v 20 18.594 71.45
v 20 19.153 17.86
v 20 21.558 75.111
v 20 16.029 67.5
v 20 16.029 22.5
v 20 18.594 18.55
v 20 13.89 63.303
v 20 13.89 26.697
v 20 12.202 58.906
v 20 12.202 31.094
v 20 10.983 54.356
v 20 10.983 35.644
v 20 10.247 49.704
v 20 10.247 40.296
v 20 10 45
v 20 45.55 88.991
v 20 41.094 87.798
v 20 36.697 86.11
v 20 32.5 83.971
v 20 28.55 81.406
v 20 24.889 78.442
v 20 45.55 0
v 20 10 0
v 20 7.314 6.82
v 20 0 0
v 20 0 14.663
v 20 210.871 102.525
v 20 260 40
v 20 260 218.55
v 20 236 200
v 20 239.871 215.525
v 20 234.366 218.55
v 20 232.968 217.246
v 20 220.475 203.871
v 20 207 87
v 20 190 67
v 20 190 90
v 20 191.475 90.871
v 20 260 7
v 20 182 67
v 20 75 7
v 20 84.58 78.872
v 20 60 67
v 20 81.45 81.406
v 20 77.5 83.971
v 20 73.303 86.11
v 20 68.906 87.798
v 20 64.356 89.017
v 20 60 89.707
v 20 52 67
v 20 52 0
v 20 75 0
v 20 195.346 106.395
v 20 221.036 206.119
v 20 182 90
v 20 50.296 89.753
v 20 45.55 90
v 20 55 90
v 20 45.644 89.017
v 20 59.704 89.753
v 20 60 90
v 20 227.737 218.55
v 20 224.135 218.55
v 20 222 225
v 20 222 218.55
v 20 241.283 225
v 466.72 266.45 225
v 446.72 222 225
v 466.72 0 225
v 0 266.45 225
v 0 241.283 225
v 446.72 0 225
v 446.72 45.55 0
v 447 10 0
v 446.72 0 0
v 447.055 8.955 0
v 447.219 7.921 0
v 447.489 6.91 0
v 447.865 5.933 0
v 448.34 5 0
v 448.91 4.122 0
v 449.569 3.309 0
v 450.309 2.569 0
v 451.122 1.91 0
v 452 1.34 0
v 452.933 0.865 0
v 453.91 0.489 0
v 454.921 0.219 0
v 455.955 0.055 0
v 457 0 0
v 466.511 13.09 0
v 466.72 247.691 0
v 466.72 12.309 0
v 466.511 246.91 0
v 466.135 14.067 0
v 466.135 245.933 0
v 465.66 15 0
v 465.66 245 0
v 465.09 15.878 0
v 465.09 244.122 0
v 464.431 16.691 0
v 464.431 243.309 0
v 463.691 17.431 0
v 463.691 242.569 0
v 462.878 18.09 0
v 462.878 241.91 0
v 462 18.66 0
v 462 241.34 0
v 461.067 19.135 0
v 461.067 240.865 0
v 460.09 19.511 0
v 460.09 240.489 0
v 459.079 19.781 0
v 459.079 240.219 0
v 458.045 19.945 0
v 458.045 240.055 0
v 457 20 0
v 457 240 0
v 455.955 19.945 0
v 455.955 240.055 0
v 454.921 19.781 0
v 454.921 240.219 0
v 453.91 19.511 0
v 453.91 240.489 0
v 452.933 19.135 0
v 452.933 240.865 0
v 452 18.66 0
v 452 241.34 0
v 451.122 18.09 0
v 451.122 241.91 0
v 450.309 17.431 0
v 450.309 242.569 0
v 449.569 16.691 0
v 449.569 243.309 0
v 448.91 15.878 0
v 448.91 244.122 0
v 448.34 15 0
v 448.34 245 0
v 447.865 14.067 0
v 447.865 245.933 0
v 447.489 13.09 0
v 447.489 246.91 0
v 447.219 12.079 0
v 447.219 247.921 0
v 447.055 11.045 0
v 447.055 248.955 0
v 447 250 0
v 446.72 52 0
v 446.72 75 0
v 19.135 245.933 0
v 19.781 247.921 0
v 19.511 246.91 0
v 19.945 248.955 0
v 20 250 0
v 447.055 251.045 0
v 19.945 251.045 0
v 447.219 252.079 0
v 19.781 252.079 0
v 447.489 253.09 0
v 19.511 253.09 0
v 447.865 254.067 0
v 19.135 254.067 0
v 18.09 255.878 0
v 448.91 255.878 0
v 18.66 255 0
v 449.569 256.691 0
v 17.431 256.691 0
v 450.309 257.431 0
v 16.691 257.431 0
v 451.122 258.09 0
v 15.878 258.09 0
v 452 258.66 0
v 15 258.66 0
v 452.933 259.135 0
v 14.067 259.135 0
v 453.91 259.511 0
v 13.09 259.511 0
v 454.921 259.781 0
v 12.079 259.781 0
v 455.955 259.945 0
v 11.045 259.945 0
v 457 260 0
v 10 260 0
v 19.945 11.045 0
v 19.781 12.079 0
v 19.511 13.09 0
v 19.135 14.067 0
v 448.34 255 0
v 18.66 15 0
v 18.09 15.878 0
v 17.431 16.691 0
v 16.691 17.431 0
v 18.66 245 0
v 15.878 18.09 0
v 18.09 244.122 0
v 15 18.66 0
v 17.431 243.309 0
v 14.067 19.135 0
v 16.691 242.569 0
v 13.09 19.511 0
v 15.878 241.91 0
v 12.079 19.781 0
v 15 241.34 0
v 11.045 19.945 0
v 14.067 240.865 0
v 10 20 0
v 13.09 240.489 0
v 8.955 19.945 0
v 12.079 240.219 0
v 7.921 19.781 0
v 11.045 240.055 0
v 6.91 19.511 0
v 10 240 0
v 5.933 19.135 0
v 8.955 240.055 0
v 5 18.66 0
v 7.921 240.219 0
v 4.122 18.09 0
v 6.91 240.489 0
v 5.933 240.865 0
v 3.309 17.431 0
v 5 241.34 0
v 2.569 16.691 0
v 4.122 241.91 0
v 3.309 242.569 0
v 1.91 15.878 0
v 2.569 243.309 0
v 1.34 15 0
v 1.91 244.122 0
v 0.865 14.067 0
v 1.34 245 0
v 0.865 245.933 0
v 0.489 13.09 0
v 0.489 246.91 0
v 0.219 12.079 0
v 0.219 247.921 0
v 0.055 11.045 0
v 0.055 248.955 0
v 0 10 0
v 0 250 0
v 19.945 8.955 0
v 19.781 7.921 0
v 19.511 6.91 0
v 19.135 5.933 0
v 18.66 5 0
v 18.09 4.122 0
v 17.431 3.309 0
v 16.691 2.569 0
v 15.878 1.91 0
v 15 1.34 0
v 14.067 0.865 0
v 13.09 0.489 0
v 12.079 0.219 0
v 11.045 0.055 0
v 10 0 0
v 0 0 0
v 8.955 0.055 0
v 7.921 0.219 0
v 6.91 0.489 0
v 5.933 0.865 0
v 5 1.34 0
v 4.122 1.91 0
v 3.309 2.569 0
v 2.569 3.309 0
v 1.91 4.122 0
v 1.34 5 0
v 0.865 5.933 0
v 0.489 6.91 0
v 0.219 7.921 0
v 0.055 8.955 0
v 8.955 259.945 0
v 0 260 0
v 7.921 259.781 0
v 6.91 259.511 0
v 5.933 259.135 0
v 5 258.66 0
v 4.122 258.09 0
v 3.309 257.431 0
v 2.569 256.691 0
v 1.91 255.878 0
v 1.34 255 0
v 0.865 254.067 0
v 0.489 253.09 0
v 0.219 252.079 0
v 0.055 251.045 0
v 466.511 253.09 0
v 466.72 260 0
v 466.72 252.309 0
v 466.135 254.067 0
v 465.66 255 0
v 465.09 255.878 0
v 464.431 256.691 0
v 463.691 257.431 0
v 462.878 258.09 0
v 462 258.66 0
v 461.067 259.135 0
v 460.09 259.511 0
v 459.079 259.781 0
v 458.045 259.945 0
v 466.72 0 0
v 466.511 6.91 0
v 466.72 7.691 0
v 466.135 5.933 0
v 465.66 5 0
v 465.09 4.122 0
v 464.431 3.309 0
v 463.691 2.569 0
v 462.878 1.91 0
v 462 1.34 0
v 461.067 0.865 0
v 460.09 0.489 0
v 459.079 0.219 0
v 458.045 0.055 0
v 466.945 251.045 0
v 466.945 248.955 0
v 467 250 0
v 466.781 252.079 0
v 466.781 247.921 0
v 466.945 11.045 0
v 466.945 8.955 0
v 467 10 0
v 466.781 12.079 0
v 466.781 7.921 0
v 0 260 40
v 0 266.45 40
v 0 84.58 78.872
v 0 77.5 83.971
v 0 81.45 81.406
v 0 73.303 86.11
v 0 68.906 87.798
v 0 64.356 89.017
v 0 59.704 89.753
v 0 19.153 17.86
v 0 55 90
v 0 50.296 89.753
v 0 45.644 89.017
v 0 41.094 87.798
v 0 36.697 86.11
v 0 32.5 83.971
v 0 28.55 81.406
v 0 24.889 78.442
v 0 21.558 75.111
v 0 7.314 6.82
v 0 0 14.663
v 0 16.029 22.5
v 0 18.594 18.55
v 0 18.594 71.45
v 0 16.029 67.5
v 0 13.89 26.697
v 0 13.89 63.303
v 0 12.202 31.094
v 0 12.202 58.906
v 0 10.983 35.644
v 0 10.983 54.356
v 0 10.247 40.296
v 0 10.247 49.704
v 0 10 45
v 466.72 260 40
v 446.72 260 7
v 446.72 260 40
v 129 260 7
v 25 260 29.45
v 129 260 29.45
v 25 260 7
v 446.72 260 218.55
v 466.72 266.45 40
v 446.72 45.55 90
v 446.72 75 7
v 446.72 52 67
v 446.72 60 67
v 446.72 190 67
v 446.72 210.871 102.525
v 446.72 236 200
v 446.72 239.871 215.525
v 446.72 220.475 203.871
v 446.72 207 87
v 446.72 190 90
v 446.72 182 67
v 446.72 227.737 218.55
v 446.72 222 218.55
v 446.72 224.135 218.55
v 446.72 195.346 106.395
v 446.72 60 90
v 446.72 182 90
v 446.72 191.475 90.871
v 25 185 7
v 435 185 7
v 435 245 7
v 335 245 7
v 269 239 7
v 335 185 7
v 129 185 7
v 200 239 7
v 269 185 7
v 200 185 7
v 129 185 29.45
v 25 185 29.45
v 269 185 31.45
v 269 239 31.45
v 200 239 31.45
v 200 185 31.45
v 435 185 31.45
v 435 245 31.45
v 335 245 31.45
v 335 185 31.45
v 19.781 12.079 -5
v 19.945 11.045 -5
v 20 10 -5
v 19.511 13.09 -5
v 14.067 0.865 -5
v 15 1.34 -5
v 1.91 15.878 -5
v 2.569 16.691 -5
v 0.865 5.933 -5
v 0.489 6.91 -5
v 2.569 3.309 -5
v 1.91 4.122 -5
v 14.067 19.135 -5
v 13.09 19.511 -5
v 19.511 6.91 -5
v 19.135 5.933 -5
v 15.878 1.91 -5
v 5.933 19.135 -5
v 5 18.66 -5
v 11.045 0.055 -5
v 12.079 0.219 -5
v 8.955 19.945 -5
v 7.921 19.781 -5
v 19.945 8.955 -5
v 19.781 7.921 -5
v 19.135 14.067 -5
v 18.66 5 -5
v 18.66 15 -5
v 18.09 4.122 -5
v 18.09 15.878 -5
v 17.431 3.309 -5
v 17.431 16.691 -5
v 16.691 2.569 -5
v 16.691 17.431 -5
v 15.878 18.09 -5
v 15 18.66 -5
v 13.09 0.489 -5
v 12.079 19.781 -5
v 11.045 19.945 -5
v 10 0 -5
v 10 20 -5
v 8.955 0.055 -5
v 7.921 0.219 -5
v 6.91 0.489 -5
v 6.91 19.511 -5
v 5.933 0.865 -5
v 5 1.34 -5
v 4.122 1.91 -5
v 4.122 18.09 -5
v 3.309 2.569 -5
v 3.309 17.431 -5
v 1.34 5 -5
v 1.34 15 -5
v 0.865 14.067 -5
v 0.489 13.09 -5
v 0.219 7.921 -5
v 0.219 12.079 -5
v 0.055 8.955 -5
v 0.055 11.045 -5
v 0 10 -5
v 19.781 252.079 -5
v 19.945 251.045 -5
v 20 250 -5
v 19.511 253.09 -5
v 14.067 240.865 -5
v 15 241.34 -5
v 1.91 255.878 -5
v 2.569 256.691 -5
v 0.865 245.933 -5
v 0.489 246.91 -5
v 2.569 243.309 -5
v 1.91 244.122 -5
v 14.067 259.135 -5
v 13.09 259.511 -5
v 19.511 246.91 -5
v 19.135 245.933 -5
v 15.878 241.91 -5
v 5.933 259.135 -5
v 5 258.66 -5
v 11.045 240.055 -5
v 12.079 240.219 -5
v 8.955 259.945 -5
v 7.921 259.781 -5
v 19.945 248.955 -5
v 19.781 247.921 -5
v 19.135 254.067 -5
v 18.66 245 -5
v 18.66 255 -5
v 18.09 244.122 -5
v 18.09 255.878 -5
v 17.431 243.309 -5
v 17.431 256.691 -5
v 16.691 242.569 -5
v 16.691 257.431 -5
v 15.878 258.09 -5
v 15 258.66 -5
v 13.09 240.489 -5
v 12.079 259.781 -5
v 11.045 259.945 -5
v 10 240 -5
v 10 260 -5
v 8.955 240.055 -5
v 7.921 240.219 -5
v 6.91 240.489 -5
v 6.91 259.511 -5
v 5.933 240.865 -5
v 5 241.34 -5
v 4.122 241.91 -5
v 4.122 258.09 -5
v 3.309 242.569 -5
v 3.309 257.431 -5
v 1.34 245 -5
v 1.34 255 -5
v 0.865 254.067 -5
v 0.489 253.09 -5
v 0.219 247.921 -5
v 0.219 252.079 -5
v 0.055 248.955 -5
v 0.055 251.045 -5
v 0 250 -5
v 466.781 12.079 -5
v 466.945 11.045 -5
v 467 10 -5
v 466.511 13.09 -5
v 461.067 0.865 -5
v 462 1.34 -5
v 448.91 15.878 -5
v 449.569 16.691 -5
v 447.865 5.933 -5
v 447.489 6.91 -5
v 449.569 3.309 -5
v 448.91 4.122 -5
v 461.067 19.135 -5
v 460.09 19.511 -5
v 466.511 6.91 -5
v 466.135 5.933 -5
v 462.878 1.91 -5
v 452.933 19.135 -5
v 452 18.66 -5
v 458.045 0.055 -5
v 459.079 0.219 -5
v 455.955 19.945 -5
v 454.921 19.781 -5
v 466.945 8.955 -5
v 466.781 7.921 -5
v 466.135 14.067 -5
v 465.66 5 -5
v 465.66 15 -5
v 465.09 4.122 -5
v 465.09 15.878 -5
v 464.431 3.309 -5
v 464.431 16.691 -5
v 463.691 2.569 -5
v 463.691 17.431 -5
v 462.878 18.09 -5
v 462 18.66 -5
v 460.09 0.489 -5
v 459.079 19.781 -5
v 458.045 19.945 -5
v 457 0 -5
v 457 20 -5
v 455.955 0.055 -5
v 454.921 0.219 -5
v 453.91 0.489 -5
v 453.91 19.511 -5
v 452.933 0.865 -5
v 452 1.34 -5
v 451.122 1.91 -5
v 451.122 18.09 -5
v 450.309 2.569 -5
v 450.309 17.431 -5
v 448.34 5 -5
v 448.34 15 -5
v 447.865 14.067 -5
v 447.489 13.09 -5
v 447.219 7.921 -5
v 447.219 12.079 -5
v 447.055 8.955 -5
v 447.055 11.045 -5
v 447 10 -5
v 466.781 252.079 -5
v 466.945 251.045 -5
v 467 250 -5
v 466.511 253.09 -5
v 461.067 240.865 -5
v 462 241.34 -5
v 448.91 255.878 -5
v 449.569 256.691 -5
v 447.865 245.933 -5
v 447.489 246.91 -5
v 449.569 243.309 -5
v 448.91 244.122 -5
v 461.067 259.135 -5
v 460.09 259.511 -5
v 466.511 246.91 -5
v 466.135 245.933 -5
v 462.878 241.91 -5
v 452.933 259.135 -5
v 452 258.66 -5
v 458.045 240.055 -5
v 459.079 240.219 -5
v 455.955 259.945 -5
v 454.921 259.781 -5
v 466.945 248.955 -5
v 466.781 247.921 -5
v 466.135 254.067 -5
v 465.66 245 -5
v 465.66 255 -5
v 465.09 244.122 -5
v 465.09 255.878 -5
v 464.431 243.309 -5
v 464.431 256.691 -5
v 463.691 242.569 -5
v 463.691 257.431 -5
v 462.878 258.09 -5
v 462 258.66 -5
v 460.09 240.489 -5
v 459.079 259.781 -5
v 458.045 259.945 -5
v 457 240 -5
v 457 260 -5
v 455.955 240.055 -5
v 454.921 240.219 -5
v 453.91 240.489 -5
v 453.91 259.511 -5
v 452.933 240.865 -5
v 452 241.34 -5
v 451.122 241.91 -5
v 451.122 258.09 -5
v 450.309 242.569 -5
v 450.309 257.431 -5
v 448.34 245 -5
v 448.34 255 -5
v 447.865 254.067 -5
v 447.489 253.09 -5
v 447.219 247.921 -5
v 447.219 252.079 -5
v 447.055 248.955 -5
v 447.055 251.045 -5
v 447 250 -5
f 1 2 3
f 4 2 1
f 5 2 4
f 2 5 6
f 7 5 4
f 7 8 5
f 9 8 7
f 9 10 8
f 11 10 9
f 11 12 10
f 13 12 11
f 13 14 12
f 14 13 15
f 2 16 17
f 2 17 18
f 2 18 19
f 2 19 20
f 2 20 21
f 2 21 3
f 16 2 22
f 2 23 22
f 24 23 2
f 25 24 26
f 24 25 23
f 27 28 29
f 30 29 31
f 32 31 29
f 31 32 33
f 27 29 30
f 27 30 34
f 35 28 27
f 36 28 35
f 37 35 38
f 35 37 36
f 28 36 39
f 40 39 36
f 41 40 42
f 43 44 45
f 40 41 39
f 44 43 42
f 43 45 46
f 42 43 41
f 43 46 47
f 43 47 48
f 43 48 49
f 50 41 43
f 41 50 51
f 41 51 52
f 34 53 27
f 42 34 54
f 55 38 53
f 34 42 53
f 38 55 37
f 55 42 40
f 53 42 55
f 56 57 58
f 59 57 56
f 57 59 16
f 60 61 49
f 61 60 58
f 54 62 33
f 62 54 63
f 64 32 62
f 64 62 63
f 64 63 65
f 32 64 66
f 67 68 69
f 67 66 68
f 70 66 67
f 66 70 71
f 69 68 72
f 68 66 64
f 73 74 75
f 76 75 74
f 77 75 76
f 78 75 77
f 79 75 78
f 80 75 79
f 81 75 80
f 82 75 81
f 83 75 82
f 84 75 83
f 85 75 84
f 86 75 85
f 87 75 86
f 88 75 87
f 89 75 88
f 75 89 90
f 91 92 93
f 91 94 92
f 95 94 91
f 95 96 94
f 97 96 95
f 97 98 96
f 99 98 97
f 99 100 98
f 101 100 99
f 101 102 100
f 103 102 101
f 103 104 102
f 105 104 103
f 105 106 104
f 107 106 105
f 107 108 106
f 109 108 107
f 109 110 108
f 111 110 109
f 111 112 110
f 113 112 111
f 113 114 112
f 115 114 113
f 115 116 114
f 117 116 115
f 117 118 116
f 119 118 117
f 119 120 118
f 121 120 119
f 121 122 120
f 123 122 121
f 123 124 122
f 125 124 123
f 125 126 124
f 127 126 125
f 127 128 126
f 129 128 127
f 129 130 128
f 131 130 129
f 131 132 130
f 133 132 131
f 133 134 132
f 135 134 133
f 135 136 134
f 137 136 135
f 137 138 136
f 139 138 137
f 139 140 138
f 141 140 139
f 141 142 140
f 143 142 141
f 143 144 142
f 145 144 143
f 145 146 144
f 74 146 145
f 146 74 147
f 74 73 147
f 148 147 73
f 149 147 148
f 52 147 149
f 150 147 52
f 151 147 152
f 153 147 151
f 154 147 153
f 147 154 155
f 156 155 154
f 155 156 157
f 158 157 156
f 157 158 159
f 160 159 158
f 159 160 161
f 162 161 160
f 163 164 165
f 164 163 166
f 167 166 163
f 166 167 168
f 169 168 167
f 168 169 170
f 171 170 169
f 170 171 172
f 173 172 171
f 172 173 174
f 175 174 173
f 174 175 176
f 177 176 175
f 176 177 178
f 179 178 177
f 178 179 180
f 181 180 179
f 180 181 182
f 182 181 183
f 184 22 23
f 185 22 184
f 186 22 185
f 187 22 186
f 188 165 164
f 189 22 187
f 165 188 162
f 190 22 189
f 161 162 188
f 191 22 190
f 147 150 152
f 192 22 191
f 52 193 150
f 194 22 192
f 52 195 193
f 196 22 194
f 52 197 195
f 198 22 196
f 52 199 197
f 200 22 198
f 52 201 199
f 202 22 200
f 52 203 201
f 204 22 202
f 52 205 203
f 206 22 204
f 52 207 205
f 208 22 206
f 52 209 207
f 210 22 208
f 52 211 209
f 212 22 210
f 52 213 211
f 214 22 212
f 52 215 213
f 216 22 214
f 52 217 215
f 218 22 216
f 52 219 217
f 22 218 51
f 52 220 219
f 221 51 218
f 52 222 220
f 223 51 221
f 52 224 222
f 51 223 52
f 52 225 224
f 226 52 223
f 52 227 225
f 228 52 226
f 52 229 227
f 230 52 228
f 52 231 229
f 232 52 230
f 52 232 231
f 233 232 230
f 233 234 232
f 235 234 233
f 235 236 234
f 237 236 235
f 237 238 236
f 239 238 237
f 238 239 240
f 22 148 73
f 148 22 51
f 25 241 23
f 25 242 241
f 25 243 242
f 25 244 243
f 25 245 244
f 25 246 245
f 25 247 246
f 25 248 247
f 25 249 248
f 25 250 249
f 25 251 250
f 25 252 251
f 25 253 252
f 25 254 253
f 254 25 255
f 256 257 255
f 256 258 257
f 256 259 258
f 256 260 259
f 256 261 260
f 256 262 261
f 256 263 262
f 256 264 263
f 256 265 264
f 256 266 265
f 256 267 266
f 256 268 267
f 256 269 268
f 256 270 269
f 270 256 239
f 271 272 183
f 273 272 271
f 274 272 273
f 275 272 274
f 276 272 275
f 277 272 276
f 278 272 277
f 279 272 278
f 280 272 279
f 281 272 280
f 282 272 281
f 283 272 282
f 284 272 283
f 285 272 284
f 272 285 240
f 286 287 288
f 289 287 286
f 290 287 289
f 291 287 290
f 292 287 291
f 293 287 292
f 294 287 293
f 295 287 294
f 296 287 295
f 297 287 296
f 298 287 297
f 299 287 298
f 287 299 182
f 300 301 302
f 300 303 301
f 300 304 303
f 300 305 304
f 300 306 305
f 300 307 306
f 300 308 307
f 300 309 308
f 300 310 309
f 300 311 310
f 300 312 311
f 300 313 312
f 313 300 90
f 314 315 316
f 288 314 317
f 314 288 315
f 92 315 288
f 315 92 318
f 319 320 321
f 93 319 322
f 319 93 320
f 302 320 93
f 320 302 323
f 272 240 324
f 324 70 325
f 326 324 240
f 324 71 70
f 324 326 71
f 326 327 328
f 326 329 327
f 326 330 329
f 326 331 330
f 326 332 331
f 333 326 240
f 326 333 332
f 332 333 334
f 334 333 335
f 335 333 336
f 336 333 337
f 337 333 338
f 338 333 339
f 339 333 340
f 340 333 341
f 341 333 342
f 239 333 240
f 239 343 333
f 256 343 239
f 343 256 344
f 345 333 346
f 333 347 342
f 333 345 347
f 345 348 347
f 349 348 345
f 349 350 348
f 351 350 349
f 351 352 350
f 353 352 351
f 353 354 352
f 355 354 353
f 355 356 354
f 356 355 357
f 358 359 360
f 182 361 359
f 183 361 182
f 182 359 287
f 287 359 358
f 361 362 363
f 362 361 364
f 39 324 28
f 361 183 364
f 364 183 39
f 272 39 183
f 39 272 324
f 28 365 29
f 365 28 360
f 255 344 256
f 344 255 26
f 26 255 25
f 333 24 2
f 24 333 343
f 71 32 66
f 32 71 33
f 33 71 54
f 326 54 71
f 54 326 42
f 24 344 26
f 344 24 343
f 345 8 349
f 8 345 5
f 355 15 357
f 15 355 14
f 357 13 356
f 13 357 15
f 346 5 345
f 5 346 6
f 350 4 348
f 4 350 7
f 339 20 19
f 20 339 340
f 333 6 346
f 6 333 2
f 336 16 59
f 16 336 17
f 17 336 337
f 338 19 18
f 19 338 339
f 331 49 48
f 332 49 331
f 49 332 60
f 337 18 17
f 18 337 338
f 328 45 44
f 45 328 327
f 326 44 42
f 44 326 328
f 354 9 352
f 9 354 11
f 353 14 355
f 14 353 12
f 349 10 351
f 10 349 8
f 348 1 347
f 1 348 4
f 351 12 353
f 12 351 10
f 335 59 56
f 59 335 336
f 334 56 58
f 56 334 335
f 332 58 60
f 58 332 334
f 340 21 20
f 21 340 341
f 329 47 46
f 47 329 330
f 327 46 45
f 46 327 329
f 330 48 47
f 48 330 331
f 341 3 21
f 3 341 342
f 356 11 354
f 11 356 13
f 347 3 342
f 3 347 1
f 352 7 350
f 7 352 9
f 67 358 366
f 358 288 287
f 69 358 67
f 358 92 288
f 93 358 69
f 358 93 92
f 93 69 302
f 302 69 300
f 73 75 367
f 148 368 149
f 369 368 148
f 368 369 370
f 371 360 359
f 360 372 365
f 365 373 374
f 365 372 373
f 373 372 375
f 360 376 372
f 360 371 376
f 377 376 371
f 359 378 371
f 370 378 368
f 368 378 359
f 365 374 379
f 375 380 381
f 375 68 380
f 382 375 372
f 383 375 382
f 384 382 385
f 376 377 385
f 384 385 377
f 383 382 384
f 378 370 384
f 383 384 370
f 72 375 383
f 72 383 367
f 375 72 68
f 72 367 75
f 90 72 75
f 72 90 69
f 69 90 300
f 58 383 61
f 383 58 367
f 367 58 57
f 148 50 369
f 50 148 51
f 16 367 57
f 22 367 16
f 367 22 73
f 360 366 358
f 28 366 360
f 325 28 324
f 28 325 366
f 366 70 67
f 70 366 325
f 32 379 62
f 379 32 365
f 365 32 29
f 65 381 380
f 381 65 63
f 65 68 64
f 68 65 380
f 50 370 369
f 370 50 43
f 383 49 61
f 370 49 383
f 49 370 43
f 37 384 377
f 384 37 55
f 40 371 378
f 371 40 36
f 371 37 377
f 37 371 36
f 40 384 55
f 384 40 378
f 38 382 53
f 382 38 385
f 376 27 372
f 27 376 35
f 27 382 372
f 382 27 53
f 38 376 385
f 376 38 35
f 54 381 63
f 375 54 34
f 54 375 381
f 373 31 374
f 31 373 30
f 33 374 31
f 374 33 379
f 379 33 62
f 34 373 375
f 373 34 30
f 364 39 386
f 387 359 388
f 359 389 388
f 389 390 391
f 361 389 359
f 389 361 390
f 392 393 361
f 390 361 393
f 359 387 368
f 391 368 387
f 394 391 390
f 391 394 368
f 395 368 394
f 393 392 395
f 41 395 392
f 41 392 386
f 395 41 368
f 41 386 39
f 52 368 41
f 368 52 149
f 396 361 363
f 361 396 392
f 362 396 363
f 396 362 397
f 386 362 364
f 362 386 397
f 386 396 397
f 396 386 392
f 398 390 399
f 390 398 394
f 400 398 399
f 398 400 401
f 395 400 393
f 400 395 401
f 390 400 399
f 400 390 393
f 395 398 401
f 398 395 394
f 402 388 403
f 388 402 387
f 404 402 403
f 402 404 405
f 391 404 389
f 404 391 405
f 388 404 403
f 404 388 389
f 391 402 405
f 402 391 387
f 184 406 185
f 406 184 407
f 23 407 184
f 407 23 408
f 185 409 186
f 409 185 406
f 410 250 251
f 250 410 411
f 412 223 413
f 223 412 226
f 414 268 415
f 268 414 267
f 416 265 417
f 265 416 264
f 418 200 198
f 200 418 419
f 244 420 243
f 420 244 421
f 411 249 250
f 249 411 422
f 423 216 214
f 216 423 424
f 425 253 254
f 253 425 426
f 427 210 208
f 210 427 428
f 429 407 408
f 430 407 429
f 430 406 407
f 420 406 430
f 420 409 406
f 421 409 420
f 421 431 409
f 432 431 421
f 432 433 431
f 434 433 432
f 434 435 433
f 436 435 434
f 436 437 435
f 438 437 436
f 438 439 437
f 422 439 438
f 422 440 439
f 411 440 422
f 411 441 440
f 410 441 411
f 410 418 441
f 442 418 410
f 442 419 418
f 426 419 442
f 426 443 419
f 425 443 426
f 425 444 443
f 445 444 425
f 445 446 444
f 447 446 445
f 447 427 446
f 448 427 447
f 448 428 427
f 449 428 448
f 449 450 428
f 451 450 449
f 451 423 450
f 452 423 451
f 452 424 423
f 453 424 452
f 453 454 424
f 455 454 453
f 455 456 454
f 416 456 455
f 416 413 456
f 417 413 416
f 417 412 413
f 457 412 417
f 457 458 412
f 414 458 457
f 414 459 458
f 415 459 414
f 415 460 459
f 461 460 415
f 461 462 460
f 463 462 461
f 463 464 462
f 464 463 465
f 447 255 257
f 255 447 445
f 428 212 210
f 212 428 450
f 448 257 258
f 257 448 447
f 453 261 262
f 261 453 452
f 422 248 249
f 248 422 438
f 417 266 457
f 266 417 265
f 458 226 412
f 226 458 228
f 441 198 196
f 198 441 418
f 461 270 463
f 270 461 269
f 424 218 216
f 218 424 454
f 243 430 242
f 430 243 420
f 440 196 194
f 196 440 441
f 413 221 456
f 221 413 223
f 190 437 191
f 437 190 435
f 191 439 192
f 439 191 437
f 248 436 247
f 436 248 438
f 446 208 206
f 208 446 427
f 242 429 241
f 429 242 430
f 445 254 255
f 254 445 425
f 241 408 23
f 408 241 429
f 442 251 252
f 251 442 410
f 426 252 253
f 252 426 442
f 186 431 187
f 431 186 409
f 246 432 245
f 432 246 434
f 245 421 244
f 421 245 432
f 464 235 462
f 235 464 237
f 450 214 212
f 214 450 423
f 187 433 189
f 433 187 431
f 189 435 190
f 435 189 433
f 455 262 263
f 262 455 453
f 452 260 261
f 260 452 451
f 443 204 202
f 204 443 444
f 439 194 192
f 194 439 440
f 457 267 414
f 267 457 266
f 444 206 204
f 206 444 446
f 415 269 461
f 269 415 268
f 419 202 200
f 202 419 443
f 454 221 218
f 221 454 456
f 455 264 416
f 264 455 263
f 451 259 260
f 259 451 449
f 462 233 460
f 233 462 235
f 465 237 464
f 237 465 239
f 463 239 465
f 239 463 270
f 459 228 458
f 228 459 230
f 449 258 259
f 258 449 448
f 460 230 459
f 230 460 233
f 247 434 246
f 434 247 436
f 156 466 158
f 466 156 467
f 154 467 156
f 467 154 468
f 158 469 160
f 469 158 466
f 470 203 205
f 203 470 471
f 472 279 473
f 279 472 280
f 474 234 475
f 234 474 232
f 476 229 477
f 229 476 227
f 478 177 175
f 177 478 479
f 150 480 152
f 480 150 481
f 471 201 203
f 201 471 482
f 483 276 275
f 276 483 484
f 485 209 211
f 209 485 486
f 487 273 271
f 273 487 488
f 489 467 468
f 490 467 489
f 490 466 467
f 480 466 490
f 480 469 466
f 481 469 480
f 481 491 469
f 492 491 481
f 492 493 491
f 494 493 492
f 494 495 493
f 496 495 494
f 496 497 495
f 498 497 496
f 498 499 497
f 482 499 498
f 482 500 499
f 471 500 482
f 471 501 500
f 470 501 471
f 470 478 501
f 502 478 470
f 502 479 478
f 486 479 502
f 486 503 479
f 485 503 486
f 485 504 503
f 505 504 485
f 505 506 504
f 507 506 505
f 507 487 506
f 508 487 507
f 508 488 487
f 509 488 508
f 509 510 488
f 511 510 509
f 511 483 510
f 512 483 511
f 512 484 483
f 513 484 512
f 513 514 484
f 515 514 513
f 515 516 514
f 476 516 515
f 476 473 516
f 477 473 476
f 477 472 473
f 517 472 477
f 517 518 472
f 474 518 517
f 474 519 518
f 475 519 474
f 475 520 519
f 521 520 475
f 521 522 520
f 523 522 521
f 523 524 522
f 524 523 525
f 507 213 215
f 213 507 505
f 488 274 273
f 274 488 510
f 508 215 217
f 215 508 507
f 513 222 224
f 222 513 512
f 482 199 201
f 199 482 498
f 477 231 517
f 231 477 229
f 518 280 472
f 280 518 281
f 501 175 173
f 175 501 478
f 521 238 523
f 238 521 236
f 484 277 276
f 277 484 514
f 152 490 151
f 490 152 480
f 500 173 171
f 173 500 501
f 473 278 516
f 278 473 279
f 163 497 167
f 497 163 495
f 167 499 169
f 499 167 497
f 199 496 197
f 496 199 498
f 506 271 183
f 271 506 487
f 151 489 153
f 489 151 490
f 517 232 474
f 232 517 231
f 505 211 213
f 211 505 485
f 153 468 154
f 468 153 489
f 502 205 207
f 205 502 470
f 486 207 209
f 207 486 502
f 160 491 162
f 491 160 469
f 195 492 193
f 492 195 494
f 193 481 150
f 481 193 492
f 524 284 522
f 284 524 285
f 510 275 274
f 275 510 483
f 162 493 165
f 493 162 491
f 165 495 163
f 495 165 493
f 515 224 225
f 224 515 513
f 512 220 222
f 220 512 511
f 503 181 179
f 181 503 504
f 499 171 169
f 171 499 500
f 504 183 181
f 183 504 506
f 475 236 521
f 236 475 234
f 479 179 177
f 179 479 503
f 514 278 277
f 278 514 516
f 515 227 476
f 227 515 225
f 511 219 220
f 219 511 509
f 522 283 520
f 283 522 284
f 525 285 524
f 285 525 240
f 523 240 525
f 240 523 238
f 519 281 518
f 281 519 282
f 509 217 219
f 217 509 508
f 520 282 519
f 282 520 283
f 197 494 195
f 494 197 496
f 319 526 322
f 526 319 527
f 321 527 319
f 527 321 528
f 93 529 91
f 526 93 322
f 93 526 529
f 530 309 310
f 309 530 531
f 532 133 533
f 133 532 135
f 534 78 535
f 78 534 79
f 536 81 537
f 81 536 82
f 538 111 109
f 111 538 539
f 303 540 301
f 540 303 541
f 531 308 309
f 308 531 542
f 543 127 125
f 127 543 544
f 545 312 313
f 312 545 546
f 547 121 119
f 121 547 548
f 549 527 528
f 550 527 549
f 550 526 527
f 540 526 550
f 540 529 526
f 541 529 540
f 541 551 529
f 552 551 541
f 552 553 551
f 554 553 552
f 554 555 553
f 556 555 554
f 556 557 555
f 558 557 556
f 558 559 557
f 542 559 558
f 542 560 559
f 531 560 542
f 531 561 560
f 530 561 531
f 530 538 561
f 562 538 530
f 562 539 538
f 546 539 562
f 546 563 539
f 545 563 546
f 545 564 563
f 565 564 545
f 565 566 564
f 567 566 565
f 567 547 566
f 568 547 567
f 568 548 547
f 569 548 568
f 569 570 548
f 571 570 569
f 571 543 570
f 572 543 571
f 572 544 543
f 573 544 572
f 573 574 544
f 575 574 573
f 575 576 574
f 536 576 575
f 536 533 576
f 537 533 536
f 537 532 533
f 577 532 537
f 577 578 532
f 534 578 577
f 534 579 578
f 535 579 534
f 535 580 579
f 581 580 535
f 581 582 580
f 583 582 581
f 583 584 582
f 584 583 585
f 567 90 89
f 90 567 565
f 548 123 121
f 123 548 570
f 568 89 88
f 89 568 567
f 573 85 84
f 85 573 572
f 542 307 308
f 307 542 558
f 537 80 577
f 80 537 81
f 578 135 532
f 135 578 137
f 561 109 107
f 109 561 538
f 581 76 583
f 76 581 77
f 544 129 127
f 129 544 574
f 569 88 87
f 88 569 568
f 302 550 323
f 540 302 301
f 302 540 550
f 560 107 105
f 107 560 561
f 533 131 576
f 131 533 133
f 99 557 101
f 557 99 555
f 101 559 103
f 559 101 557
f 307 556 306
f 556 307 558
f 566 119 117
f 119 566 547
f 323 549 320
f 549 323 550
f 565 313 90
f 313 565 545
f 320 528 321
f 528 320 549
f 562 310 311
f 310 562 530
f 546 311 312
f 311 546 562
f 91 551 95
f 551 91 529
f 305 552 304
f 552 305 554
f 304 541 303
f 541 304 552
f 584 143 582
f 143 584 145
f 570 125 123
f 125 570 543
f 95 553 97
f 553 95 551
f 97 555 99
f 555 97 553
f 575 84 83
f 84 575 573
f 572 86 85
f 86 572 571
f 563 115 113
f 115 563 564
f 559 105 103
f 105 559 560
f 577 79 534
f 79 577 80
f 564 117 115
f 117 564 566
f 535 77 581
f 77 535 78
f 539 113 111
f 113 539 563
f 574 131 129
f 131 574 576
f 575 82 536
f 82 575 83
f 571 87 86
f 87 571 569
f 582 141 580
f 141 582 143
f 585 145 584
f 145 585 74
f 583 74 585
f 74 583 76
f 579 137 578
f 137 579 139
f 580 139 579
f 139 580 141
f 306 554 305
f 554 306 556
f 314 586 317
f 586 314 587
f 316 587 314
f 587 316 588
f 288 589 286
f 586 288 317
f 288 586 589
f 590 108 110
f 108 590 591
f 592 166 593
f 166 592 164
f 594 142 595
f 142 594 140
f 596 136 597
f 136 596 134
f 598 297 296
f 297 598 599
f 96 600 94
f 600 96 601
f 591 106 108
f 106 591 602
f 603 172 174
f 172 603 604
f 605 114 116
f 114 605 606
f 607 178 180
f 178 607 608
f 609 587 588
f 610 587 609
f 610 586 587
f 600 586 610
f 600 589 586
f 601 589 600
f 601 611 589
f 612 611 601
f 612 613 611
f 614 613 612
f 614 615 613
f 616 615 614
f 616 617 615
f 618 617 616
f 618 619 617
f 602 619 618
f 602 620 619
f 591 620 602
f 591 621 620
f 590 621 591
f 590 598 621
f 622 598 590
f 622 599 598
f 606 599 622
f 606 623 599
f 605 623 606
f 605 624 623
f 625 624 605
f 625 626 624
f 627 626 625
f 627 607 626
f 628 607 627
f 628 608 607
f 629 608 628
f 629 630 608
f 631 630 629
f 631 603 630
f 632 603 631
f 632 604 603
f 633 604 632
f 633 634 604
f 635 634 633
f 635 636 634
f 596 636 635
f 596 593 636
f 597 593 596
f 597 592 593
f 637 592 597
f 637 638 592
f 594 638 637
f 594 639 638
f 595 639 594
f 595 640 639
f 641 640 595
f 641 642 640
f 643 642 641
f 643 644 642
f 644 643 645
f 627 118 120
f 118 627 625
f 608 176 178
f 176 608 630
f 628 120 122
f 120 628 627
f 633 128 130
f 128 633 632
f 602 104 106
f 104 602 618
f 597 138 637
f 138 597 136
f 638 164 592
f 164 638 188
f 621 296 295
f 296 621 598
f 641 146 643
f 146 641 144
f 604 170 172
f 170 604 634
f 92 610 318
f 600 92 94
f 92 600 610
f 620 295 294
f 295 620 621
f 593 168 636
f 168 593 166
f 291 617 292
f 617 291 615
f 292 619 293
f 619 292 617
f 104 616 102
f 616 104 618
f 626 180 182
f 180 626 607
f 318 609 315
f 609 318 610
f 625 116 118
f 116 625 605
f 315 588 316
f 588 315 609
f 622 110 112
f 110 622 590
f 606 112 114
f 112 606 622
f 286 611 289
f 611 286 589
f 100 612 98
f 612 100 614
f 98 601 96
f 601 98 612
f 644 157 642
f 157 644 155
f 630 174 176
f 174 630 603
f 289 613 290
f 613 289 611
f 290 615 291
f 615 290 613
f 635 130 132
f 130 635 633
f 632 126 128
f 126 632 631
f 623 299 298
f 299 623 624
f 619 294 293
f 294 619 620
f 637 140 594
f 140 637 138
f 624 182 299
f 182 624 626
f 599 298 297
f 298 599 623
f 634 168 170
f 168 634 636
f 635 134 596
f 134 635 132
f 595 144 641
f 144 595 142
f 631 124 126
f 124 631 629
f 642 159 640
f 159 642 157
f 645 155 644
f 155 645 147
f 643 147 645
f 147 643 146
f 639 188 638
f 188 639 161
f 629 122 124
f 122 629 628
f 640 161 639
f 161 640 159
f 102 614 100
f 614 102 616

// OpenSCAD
// Flipotronics V1
// San Jose, 5/4/2019, 
showSide = true;
$fn=60;
HP = 5.08;
U3 = 133.4;
thick = 6.45;
plateWidth = 20;
rackSteelLength = 84 * HP;

length = 260;
height = 225;
radius = 0;

// left panel




translate([0, 0, 0]){ 
    difference(){
        roundedBox(length, plateWidth, height);
         rotate([43, 0, 0]){
            translate([0, 10, 0]){ 
                roundedBox(length*2, plateWidth*2, height*2);
            }
        }   
    }
}
color([1,0,0])
translate([0, 55, 45]){ 
        rotate([0,90,0]){
            cylinder(h=plateWidth, d1=90, d2=90, center=false);
        }
}

// right panel
if(showSide){
color([1,1,0])
translate([plateWidth + rackSteelLength, 0, 0]){ 
    roundedBox(length, plateWidth, height);
}
}

//front wood
translate([plateWidth , 60-thick-8, 0]){ 
    roundedBox(thick, rackSteelLength, 90);
}

//back wood
translate([0 , 260, 40]){ 
    roundedBox(thick, rackSteelLength+40, 185);
}

//top wood
translate([plateWidth , 222, 225-thick]){ 
    roundedBox(38, rackSteelLength, thick);
}

//rack metal
color([1,0,0])
translate([plateWidth , 60-8, 90-23]){ 
    roundedBox(8, rackSteelLength, 23);
}


//rack metal 2
color([1,0,0])
translate([plateWidth , 60 + 130-8, 90-23]){ 
    roundedBox(8, rackSteelLength, 23);
}


//rack wood 1
color([1,0,1])
translate([plateWidth , 60 + 147, 87]){ 
     rotate([76,00,0]){
        roundedBox(16, rackSteelLength, 16);
     }
}

//rack wood 2
color([1,0,1])
translate([plateWidth , 236, 200]){ 
    rotate([76,00,0]){
        roundedBox(16, rackSteelLength, 16);
    }
}



//floor
translate([plateWidth , 75, 0]){ 
    roundedBox(185, rackSteelLength, 7);
}

// PI
color([0,1,0])
translate([25 , 185, thick]){ 
    roundedBox(75, 104, 23);
}


// Arduino
color([0,1,0])
translate([200 , 185, thick]){ 
    roundedBox(54, 69, 25);
}

// Power
color([0,1,0])
translate([335 , 185, thick]){ 
    roundedBox(60, 100, 25);
}


// Foot
color([0,0,0])
translate([10 , 10, -5]){ 
   cylinder(h=5, d1=20, d2=20, center=false);
}
color([0,0,0])
translate([10 , 250, -5]){ 
   cylinder(h=5, d1=20, d2=20, center=false);
}
color([0,0,0])
translate([457 , 10, -5]){ 
   cylinder(h=5, d1=20, d2=20, center=false);
}
color([0,0,0])
translate([457 , 250, -5]){ 
   cylinder(h=5, d1=20, d2=20, center=false);
}




module roundedBox(length, width, height)
{

    //base rounded shape
    minkowski() {
        cube(size=[width,length, height]);
        cylinder(r=radius, h=1);
    }
  
    
}
